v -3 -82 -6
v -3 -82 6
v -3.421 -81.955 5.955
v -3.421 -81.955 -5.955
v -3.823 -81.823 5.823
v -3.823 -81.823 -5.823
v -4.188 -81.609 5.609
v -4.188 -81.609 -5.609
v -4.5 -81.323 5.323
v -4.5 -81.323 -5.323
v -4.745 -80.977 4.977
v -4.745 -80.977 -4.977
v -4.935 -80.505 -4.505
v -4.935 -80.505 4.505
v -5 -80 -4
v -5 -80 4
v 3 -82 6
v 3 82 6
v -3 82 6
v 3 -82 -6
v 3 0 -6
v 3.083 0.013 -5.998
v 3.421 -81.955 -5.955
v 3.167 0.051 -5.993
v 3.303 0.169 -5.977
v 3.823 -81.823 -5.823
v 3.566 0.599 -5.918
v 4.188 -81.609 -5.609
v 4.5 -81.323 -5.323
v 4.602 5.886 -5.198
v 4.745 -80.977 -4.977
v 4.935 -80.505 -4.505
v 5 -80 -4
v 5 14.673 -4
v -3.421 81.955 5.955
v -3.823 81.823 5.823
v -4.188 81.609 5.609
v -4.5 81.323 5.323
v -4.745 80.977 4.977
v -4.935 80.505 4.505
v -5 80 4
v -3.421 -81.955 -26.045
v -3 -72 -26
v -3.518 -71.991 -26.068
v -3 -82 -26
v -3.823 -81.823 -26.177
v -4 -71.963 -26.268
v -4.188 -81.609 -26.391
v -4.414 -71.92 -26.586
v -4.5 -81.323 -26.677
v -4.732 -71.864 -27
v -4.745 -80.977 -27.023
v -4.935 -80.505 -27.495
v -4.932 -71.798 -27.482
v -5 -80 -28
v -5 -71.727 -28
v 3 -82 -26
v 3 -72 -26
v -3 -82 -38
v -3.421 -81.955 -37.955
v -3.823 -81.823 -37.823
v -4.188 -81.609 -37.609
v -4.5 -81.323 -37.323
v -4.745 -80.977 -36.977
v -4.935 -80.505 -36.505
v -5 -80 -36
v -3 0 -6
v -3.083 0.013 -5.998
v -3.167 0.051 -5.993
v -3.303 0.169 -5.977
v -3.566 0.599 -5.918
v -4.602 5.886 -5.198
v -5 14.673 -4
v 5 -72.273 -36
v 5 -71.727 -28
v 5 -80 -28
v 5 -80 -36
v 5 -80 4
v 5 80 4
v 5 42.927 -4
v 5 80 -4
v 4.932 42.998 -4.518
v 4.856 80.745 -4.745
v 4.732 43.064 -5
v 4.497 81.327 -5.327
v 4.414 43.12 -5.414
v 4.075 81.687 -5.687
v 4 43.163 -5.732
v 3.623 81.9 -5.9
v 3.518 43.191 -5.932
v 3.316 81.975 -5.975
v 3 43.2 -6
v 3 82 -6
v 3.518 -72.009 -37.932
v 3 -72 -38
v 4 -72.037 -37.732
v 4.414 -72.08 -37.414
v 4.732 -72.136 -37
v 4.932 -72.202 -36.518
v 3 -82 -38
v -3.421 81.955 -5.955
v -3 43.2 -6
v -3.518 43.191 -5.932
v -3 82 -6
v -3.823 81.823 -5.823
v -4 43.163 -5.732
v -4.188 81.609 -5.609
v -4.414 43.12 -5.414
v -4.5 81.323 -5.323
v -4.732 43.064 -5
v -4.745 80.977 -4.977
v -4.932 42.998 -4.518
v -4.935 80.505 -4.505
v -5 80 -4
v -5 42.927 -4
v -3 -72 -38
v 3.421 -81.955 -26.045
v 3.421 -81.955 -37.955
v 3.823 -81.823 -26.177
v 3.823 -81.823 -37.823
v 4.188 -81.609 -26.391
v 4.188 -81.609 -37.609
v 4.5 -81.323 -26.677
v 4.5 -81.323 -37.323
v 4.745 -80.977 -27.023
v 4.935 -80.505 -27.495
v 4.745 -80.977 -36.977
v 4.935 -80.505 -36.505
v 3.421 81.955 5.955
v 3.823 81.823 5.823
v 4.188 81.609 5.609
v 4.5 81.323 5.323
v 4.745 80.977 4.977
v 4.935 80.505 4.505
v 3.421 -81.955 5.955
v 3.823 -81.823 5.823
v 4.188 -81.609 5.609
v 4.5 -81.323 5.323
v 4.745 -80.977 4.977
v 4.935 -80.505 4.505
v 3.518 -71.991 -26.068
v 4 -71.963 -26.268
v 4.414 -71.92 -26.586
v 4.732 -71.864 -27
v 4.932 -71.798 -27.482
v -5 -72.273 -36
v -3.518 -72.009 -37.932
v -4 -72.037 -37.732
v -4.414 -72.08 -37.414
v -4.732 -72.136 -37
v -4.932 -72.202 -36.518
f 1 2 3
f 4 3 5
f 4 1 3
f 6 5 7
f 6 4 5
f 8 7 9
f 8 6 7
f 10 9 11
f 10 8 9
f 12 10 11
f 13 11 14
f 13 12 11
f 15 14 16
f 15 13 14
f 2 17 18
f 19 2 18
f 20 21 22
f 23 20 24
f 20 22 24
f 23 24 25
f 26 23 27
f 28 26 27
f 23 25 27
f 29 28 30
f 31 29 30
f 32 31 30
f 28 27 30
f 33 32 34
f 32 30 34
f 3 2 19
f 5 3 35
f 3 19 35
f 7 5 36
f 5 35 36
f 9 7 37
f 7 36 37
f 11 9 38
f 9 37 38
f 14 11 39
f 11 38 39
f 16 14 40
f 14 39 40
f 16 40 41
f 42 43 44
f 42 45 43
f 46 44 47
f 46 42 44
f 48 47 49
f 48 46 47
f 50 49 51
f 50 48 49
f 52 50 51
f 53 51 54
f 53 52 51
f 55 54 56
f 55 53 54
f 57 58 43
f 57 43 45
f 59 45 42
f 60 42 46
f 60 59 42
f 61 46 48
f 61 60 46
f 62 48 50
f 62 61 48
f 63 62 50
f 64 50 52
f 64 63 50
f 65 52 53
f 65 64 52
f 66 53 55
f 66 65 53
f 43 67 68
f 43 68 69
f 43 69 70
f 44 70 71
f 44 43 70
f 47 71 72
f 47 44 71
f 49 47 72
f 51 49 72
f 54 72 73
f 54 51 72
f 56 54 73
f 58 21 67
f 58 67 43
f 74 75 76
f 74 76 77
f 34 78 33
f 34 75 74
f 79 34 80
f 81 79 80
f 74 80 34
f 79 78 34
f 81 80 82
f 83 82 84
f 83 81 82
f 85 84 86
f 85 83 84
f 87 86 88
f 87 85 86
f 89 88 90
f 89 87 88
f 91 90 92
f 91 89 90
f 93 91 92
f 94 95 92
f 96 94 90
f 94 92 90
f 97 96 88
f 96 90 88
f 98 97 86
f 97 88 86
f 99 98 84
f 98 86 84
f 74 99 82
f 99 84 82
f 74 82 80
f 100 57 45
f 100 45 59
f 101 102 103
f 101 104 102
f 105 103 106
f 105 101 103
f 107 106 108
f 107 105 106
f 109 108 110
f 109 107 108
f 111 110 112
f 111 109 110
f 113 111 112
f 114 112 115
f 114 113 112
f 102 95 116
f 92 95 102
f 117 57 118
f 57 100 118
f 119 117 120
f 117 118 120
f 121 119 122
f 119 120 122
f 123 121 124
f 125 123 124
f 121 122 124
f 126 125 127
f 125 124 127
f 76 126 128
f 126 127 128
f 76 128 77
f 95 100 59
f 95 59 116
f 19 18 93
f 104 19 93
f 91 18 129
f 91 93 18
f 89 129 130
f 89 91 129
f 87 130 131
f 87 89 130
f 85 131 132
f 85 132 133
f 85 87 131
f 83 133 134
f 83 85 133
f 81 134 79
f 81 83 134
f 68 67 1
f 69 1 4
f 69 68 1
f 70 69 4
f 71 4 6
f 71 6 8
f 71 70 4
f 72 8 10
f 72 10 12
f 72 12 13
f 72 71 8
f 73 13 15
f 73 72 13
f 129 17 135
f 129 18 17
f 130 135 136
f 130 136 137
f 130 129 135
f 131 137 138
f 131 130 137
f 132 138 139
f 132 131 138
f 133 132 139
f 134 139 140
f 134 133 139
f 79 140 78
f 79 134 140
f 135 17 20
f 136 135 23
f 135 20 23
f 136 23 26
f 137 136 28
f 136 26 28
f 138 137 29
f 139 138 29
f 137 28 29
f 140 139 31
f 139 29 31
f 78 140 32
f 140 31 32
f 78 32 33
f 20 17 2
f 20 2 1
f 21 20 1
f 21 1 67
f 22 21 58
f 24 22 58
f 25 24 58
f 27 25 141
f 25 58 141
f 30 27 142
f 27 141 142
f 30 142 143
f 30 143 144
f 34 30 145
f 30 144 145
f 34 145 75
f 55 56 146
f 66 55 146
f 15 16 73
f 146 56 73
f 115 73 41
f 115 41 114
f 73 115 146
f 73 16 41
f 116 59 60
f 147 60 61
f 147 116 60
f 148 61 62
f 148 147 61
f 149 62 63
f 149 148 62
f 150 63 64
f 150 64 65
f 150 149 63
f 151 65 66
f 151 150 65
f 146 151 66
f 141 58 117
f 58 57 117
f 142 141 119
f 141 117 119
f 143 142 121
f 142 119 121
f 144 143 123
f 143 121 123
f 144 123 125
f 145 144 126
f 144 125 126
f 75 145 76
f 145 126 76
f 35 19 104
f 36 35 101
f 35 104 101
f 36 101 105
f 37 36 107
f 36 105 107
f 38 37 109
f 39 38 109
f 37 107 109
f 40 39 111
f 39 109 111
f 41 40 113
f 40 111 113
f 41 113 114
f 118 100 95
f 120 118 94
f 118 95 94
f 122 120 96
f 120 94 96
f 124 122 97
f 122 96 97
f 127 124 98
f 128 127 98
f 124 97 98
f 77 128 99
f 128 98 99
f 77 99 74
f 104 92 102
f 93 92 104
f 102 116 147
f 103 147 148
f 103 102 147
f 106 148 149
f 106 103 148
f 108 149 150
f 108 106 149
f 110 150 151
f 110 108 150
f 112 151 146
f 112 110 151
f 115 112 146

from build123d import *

# Parameters (mm, degrees)
SKETCH1_W           = 12
SKETCH1_H           = 164
BOSS_EXTRUDE1_DEPTH = 5
FILLET1_R           = 2


with BuildPart() as part:
    # Sketch1 → Boss-Extrude1 (new, symmetric)
    with BuildSketch(Plane(origin=(0, 0, 0), x_dir=(0, 0, -1), z_dir=(1, 0, 0))):
        Polygon((38, -72), (6, 43.2), (6, 0), (26, -72), (26, -82), (38, -82), align=None)
        Rectangle(SKETCH1_W, SKETCH1_H)
    extrude(amount=BOSS_EXTRUDE1_DEPTH, both=True)

    # Fillet1
    fillet1_edges = [part.edges().sort_by_distance(p)[0] for p in [
        (5, -77, -26),
        (-5, -41, -6),
        (-5, -82, 0),
        (-5, 0, 6),
        (-5, 82, 0),
        (-5, 62.6, -6),
        (-5, -14.4, -22),
        (-5, -77, -38),
        (5, -82, -32),
        (-5, -82, -32),
        (-5, -77, -26),
        (-5, -36, -16),
        (5, -77, -38),
        (5, -14.4, -22),
        (5, 62.6, -6),
        (5, 82, 0),
        (5, 0, 6),
        (5, -82, 0),
        (5, -36, -16),
        (5, -41, -6),
    ]]
    fillet(fillet1_edges, radius=FILLET1_R)


solid = part.part
